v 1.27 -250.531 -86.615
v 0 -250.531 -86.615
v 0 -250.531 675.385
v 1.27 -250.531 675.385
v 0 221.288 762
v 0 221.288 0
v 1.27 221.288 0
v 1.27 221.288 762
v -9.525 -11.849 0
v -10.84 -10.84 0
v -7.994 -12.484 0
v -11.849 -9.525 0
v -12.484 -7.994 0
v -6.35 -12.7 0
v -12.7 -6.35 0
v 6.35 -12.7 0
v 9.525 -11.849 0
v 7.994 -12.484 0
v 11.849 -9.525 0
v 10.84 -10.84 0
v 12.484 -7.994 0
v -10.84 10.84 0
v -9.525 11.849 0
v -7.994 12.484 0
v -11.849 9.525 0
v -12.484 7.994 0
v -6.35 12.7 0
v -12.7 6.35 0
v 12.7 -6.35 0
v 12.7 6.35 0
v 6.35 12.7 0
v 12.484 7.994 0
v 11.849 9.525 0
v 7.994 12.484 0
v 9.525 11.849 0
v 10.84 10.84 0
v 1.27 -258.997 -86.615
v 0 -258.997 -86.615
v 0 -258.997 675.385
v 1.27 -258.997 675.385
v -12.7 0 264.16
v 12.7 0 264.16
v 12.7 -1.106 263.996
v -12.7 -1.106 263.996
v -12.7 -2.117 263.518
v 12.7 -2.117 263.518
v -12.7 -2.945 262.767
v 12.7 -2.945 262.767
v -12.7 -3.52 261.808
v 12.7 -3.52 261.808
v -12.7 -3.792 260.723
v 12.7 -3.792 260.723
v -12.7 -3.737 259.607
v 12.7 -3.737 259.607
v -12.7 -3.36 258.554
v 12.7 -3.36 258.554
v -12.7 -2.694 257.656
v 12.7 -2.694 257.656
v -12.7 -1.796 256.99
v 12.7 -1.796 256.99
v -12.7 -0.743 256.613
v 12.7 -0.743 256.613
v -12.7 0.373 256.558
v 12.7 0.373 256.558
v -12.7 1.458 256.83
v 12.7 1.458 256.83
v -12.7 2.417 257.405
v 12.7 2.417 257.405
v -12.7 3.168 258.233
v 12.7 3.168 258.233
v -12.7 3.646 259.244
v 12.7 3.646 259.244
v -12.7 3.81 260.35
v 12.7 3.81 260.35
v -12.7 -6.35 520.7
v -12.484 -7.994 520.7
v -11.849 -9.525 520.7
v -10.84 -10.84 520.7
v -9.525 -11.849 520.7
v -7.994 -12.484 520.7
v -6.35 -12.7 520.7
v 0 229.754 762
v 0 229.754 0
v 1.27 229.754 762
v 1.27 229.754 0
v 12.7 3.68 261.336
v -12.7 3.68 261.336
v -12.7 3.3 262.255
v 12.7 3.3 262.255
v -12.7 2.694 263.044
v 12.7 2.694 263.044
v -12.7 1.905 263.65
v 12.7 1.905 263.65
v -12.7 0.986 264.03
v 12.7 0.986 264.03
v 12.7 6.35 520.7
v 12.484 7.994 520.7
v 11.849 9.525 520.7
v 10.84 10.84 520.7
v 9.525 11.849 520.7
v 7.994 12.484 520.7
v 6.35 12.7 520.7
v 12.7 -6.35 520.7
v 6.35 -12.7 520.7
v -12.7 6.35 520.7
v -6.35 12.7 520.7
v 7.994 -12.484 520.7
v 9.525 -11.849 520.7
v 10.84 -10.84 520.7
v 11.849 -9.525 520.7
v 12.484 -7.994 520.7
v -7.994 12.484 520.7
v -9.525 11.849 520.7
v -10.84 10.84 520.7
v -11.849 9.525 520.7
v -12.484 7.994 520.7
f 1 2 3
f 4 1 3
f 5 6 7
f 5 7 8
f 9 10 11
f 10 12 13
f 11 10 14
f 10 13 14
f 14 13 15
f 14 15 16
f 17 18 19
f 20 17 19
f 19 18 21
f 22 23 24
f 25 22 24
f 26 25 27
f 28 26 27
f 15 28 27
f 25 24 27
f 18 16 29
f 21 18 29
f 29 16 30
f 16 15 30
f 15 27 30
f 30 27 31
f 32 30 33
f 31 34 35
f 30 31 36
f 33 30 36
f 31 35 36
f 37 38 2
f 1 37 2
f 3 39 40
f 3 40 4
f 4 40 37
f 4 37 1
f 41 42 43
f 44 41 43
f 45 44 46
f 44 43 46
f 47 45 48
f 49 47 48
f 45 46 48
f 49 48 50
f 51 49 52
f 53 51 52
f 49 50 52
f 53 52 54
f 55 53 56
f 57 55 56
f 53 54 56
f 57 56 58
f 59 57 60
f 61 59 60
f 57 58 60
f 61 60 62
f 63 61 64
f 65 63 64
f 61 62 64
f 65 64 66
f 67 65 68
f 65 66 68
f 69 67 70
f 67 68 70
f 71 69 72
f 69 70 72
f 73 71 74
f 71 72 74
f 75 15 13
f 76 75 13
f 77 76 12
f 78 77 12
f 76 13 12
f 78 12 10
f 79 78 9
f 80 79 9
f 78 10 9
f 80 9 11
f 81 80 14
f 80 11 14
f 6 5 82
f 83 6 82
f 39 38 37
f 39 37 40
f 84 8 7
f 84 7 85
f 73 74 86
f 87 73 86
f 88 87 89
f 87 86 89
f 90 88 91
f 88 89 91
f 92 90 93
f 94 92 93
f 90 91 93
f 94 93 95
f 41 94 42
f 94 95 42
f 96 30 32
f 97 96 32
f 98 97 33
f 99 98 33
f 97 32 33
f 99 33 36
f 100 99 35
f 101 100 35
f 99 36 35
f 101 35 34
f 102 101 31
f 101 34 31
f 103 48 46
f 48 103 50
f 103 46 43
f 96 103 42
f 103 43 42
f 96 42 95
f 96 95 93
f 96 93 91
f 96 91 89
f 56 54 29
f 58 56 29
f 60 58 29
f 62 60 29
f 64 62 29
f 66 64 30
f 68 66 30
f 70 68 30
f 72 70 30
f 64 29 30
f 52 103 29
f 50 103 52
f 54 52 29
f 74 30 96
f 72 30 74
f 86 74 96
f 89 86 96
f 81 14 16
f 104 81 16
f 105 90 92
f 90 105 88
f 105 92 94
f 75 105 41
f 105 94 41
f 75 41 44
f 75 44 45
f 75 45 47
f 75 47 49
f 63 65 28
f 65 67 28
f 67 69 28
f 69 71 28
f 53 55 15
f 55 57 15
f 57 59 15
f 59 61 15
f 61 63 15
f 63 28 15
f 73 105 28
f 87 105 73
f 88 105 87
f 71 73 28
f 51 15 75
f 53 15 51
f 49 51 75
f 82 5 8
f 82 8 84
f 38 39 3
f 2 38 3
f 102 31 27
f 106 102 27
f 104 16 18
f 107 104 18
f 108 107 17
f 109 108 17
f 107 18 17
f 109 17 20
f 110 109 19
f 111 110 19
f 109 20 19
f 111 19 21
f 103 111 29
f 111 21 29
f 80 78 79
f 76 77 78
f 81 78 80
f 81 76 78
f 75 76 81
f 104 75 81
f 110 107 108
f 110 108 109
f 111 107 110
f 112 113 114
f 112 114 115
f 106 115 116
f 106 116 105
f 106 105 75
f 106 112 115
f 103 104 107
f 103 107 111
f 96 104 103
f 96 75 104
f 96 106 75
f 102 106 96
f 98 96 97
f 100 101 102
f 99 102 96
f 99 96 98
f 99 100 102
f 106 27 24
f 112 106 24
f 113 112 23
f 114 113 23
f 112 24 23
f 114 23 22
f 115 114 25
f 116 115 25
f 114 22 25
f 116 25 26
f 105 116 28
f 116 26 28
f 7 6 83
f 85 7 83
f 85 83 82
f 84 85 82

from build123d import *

# Parameters (mm, degrees)
F1_DEPTH = 520.7
F2_W     = 8.46582
F2_H     = 762
F3_DEPTH = 1.27
F4_W     = 8.46582
F4_H     = 762
F5_DEPTH = 1.27
F7_DEPTH = 25.4


with BuildPart() as f1:
    # F0 (on Top) → F1 (new body)
    with BuildSketch(Plane.XY):
        with BuildLine():
            ThreePointArc((12.7, 6.35), (10.840128, 10.840128), (6.35, 12.7))
            Line((6.35, 12.7), (-6.35, 12.7))
            ThreePointArc((-6.35, 12.7), (-10.840128, 10.840128), (-12.7, 6.35))
            Line((-12.7, 6.35), (-12.7, -6.35))
            ThreePointArc((-12.7, -6.35), (-10.840128, -10.840128), (-6.35, -12.7))
            Line((-6.35, -12.7), (6.35, -12.7))
            ThreePointArc((6.35, -12.7), (10.840128, -10.840128), (12.7, -6.35))
            Line((12.7, -6.35), (12.7, 6.35))
        make_face()
    extrude(amount=F1_DEPTH)

    # F6 (on face) → F7 (cut)
    with BuildSketch(Plane.YZ.offset(12.7)):
        with BuildLine():
            ThreePointArc((3.81, 260.35), (2.694077, 263.044077), (0, 264.16))
            ThreePointArc((0, 264.16), (-2.694077, 257.655923), (3.81, 260.35))
        make_face()
    extrude(amount=-F7_DEPTH, mode=Mode.SUBTRACT)


with BuildPart() as f3:
    # F2 (on Right) → F3 (new body)
    with BuildSketch(Plane.YZ):
        with Locations((-254.764381, 294.385428)):
            Rectangle(F2_W, F2_H)
    extrude(amount=F3_DEPTH)


with BuildPart() as f5:
    # F4 (on Right) → F5 (new body)
    with BuildSketch(Plane.YZ):
        with Locations((225.521233, 381)):
            Rectangle(F4_W, F4_H)
    extrude(amount=F5_DEPTH)


solid = Compound([f1.part, f3.part, f5.part])
